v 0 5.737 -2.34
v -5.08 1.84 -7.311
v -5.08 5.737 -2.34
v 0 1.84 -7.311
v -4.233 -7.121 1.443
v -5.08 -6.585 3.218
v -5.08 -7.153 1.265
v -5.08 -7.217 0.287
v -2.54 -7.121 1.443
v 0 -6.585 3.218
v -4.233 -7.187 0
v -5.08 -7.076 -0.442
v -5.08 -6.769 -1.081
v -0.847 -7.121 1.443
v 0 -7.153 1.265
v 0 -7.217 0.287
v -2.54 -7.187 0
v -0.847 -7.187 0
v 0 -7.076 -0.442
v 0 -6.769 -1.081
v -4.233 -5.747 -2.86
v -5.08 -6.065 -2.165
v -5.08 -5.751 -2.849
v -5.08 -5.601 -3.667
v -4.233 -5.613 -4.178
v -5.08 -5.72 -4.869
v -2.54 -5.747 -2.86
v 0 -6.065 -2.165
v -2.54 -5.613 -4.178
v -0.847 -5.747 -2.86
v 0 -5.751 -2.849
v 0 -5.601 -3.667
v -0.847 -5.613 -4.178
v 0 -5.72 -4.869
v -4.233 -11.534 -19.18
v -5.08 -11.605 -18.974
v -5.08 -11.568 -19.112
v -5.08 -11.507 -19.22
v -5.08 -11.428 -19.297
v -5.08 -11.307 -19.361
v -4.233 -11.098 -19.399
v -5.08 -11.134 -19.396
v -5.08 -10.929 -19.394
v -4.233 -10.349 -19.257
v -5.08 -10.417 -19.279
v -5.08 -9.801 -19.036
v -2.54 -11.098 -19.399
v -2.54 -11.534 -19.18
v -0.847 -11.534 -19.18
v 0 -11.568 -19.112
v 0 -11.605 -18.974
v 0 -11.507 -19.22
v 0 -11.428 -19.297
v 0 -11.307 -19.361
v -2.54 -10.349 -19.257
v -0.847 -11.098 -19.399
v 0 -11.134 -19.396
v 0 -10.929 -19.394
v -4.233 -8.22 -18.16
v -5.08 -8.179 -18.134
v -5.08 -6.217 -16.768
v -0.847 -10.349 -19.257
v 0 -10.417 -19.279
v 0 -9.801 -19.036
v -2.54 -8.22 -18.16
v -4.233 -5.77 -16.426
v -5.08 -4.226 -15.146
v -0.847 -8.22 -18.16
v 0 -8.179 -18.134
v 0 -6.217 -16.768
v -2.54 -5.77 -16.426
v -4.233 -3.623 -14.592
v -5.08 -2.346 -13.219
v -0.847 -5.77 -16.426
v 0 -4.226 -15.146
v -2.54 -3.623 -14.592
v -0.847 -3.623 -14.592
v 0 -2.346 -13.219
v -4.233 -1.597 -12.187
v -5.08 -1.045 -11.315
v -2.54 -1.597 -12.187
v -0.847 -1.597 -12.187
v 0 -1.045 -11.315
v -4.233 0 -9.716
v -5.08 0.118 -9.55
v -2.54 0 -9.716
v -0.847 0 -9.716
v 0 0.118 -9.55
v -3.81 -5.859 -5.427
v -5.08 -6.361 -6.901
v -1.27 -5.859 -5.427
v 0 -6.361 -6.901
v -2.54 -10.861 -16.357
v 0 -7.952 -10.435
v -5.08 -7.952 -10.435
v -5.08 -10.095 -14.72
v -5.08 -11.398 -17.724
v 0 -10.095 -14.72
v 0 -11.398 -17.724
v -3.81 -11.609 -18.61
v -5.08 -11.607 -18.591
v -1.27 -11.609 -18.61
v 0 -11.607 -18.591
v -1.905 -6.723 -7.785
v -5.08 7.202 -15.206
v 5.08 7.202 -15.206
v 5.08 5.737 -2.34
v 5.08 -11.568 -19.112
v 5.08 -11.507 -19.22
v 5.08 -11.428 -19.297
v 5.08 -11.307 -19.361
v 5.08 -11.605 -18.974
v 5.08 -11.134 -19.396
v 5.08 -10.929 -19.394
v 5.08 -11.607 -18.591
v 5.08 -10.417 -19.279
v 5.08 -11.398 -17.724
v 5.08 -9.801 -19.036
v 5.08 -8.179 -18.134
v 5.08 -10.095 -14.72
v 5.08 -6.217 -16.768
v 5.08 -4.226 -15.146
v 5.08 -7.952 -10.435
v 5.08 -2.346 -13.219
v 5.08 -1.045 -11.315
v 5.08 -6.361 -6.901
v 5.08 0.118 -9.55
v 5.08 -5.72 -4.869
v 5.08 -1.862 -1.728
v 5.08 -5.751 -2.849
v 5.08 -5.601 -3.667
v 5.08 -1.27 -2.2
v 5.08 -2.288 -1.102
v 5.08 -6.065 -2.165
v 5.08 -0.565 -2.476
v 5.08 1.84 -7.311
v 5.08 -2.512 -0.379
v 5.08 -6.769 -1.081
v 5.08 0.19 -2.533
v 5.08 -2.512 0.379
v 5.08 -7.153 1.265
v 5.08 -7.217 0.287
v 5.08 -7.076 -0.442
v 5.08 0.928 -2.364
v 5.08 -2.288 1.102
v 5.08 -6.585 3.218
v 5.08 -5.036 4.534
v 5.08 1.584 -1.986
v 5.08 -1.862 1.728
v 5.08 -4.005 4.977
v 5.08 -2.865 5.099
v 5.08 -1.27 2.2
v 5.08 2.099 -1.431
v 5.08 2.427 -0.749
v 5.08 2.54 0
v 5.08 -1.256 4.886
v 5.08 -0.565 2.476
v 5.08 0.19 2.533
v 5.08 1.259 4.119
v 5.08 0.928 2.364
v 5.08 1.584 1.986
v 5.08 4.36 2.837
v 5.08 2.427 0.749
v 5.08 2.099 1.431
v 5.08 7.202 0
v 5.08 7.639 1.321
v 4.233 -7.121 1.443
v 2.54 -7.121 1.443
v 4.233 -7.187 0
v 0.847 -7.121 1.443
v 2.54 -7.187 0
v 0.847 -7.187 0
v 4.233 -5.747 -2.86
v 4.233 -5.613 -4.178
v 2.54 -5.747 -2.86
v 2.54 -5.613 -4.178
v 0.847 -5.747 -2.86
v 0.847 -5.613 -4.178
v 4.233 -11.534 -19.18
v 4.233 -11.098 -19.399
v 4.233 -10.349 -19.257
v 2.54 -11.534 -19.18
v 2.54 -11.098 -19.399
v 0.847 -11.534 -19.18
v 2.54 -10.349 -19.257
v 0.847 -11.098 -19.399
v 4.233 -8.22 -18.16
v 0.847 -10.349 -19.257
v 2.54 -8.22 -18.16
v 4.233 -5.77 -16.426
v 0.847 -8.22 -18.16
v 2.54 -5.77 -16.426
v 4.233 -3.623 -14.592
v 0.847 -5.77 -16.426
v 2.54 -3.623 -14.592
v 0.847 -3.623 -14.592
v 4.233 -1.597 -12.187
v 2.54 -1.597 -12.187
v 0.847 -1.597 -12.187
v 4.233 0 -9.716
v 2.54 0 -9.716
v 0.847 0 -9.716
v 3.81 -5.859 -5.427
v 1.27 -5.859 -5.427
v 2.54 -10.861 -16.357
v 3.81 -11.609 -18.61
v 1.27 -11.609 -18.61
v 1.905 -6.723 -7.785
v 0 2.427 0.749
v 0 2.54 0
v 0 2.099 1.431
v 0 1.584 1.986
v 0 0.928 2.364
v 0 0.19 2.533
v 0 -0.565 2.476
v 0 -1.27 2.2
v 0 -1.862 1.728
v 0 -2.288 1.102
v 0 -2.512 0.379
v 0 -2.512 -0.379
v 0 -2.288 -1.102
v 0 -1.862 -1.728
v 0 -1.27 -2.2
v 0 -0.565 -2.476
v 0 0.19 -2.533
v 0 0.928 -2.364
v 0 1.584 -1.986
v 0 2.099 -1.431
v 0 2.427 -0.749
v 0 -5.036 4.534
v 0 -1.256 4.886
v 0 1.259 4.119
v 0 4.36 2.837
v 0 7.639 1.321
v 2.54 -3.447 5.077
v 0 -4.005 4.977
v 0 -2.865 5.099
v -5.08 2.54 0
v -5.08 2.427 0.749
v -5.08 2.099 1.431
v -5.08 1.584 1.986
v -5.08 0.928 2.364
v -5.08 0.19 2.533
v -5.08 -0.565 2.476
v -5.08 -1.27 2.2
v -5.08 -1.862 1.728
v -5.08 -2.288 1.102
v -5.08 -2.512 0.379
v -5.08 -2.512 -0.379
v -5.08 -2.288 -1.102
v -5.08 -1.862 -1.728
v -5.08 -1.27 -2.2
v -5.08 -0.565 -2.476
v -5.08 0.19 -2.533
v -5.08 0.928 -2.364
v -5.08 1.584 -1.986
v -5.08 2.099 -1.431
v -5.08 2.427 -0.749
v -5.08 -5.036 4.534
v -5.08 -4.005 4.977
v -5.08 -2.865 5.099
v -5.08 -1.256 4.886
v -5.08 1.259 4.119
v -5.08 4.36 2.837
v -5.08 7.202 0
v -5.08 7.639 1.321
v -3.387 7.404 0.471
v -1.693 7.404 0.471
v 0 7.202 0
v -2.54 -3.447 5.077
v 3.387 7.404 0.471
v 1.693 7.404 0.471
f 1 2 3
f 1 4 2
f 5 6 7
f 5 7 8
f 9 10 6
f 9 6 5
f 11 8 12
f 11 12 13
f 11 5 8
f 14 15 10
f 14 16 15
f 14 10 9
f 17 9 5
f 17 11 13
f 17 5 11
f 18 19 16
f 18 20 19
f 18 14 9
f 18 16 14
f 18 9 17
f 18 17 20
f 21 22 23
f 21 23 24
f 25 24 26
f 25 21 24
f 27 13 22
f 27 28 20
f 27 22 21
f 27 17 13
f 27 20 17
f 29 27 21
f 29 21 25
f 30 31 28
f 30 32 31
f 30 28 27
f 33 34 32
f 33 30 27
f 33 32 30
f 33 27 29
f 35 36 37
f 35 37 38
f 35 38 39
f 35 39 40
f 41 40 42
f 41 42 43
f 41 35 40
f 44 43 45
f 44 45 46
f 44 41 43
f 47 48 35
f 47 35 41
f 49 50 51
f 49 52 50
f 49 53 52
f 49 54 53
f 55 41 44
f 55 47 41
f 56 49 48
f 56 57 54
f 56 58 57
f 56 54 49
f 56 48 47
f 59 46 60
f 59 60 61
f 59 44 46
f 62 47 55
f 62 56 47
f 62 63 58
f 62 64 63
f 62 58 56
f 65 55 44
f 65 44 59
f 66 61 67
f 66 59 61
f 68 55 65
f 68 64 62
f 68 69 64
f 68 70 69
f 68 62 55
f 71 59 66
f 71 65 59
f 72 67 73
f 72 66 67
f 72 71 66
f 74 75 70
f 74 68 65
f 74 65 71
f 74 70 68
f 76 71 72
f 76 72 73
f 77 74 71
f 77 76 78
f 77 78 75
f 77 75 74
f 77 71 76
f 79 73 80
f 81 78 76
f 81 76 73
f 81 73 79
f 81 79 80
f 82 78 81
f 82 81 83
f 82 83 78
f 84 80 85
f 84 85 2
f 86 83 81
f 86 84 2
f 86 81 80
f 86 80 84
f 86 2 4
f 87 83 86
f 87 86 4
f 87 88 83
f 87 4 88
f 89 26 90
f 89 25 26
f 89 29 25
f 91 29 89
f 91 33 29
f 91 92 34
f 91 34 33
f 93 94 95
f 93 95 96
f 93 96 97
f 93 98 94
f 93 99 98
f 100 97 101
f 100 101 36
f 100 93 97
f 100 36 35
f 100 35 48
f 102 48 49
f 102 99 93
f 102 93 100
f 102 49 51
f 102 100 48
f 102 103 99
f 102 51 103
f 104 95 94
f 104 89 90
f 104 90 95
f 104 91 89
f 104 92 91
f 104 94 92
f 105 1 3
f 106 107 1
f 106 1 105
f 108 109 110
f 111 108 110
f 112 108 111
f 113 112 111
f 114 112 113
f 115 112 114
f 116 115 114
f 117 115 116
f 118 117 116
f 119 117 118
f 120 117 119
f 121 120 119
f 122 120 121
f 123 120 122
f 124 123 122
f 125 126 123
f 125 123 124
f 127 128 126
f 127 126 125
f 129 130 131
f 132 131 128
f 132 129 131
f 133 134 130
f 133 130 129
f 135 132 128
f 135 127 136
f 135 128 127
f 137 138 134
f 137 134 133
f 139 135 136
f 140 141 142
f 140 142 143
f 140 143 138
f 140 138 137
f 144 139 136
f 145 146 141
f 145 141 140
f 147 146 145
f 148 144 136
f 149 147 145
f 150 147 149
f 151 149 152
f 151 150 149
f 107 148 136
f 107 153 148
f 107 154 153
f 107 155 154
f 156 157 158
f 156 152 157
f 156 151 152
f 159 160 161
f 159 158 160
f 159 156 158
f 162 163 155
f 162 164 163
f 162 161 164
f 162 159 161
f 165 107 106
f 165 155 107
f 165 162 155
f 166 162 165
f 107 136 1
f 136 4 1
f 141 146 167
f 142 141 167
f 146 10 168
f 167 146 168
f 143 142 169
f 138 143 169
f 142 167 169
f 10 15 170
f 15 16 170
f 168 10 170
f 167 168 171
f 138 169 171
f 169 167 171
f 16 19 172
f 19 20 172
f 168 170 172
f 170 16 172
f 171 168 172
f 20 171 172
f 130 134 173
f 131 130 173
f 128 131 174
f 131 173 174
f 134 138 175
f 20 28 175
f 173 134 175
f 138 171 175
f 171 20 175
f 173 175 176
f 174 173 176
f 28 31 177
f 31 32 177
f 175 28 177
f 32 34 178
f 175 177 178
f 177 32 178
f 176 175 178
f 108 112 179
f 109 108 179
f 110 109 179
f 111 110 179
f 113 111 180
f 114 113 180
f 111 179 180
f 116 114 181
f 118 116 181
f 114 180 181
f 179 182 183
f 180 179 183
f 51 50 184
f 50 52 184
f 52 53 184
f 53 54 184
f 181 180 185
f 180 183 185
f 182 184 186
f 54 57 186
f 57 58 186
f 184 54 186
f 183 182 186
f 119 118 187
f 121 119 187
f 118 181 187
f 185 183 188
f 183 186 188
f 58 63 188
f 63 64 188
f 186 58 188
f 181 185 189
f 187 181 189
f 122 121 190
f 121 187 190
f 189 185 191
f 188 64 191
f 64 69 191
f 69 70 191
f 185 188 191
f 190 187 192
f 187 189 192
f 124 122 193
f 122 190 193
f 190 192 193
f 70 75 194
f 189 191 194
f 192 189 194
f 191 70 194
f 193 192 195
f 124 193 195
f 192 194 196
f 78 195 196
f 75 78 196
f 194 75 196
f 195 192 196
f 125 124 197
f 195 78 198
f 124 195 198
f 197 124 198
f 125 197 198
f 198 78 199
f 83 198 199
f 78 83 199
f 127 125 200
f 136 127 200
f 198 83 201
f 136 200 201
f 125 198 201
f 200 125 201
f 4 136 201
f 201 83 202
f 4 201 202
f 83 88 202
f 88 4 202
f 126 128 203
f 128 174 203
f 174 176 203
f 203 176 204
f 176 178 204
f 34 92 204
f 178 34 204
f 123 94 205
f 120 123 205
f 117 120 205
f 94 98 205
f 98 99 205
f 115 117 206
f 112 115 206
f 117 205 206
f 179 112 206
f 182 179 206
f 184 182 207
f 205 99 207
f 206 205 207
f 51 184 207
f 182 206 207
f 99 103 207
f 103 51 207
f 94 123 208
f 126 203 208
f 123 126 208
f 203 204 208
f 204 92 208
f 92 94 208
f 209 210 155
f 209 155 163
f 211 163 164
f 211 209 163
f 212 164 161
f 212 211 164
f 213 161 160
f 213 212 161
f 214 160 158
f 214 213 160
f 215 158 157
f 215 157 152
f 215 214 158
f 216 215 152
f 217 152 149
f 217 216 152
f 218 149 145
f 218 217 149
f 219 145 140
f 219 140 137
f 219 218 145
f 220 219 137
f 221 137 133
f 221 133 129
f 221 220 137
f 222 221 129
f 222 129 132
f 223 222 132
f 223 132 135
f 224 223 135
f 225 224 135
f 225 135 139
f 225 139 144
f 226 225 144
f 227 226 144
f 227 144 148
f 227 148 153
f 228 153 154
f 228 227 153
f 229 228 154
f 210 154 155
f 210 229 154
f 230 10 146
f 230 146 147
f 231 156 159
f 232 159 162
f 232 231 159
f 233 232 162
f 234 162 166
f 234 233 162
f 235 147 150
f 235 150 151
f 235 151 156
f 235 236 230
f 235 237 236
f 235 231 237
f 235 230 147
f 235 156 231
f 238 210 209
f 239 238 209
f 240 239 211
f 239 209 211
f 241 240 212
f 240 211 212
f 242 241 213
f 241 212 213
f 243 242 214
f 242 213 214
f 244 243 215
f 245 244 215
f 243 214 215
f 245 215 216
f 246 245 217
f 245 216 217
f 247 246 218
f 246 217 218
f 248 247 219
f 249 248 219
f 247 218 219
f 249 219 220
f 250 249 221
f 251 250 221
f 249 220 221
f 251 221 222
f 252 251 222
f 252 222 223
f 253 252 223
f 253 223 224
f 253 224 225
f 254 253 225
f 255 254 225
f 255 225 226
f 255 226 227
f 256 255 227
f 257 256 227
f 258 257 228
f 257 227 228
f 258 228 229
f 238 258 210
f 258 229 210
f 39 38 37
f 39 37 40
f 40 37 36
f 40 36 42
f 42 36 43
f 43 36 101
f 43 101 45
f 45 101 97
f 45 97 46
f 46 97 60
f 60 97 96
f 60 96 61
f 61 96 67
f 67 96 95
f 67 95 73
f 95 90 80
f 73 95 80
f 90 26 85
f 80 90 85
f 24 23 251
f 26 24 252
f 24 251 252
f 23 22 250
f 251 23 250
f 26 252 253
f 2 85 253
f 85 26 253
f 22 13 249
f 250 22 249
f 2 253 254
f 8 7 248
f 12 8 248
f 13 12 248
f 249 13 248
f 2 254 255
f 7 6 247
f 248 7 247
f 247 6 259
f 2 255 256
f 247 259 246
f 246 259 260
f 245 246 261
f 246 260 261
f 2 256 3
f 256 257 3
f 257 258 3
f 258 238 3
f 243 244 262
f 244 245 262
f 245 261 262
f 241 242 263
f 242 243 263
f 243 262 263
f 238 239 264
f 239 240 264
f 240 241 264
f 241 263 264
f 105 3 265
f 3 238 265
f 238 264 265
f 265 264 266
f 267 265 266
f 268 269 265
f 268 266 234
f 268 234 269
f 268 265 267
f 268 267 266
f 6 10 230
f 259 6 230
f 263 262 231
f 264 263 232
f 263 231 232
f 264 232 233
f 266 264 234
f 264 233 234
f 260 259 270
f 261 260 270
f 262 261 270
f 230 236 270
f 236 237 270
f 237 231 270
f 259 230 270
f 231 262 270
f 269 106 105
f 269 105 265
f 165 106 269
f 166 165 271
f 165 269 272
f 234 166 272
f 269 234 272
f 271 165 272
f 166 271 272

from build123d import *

# Parameters (mm, degrees)
F0_R     = 2.54
F1_DEPTH = 5.08
F2_DEPTH = 5.08


with BuildPart() as f1:
    # F0 (on Right) → F1 (new body)
    with BuildSketch(Plane.YZ):
        with BuildLine():
            add(Edge.make_bspline(
                [(5.7373761011, -2.3396002155), (6.3636757796, -1.4695139602), (6.8824801089, -0.6671431106), (7.2017014027, 0)],
                knots=[0.9726600579, 0.9726600579, 0.9726600579, 0.9726600579, 1, 1, 1, 1], degree=3))
            add(Edge.make_bspline(
                [(7.2017014027, 0), (7.43784243, 0.4935130036), (7.5647683257, 0.9130271561), (7.6394075525, 1.320772751)],
                knots=[0, 0, 0, 0, 0.0202244716, 0.0202244716, 0.0202244716, 0.0202244716], degree=3))
            add(Edge.make_bspline(
                [(-6.5845213743, 3.2176323689), (-5.7226572699, 4.074359879), (-3.3097092588, 6.4628506518), (3.3649706241, 3.3301150863), (7.6394075525, 1.320772751)],
                knots=[0, 0, 0, 0, 0.3582304762, 1, 1, 1, 1], degree=3))
            add(Edge.make_bspline(
                [(-6.5845213743, 3.2176323689), (-7.0813126232, 1.9463419947), (-7.7578226122, -1.2426403007), (-2.5552751462, -3.1323254855), (-17.3021828873, -24.8689880261), (-2.0545003286, -14.0641893523), (-1.054386327, -10.5362435767), (3.9961671701, -4.7585731298), (5.7373761011, -2.3396002155)],
                knots=[0.5175442063, 0.5175442063, 0.5175442063, 0.5175442063, 0.5513920798, 0.6141866243, 0.7335344244, 0.823407112, 0.896650836, 0.9726600579, 0.9726600579, 0.9726600579, 0.9726600579], degree=3))
        make_face()
        Circle(F0_R, mode=Mode.SUBTRACT)
        with BuildLine():
            Line((7.2017014027, -15.2059905231), (7.2017014027, 0))
            add(Edge.make_bspline(
                [(5.7373761011, -2.3396002155), (6.3636757796, -1.4695139602), (6.8824801089, -0.6671431106), (7.2017014027, 0)],
                knots=[0.9726600579, 0.9726600579, 0.9726600579, 0.9726600579, 1, 1, 1, 1], degree=3))
            Line((5.7373761011, -2.3396002155), (7.2017014027, -15.2059905231))
        make_face()
    extrude(amount=F1_DEPTH)

    # F0 (on Right) → F2 (join)
    with BuildSketch(Plane.YZ):
        with BuildLine():
            add(Edge.make_bspline(
                [(5.7373761011, -2.3396002155), (6.3636757796, -1.4695139602), (6.8824801089, -0.6671431106), (7.2017014027, 0)],
                knots=[0.9726600579, 0.9726600579, 0.9726600579, 0.9726600579, 1, 1, 1, 1], degree=3))
            add(Edge.make_bspline(
                [(7.2017014027, 0), (7.43784243, 0.4935130036), (7.5647683257, 0.9130271561), (7.6394075525, 1.320772751)],
                knots=[0, 0, 0, 0, 0.0202244716, 0.0202244716, 0.0202244716, 0.0202244716], degree=3))
            add(Edge.make_bspline(
                [(-6.5845213743, 3.2176323689), (-5.7226572699, 4.074359879), (-3.3097092588, 6.4628506518), (3.3649706241, 3.3301150863), (7.6394075525, 1.320772751)],
                knots=[0, 0, 0, 0, 0.3582304762, 1, 1, 1, 1], degree=3))
            add(Edge.make_bspline(
                [(-6.5845213743, 3.2176323689), (-7.0813126232, 1.9463419947), (-7.7578226122, -1.2426403007), (-2.5552751462, -3.1323254855), (-17.3021828873, -24.8689880261), (-2.0545003286, -14.0641893523), (-1.054386327, -10.5362435767), (3.9961671701, -4.7585731298), (5.7373761011, -2.3396002155)],
                knots=[0.5175442063, 0.5175442063, 0.5175442063, 0.5175442063, 0.5513920798, 0.6141866243, 0.7335344244, 0.823407112, 0.896650836, 0.9726600579, 0.9726600579, 0.9726600579, 0.9726600579], degree=3))
        make_face()
        Circle(F0_R, mode=Mode.SUBTRACT)
        with BuildLine():
            Line((7.2017014027, -15.2059905231), (7.2017014027, 0))
            add(Edge.make_bspline(
                [(5.7373761011, -2.3396002155), (6.3636757796, -1.4695139602), (6.8824801089, -0.6671431106), (7.2017014027, 0)],
                knots=[0.9726600579, 0.9726600579, 0.9726600579, 0.9726600579, 1, 1, 1, 1], degree=3))
            Line((5.7373761011, -2.3396002155), (7.2017014027, -15.2059905231))
        make_face()
    extrude(amount=-F2_DEPTH)


solid = f1.part
